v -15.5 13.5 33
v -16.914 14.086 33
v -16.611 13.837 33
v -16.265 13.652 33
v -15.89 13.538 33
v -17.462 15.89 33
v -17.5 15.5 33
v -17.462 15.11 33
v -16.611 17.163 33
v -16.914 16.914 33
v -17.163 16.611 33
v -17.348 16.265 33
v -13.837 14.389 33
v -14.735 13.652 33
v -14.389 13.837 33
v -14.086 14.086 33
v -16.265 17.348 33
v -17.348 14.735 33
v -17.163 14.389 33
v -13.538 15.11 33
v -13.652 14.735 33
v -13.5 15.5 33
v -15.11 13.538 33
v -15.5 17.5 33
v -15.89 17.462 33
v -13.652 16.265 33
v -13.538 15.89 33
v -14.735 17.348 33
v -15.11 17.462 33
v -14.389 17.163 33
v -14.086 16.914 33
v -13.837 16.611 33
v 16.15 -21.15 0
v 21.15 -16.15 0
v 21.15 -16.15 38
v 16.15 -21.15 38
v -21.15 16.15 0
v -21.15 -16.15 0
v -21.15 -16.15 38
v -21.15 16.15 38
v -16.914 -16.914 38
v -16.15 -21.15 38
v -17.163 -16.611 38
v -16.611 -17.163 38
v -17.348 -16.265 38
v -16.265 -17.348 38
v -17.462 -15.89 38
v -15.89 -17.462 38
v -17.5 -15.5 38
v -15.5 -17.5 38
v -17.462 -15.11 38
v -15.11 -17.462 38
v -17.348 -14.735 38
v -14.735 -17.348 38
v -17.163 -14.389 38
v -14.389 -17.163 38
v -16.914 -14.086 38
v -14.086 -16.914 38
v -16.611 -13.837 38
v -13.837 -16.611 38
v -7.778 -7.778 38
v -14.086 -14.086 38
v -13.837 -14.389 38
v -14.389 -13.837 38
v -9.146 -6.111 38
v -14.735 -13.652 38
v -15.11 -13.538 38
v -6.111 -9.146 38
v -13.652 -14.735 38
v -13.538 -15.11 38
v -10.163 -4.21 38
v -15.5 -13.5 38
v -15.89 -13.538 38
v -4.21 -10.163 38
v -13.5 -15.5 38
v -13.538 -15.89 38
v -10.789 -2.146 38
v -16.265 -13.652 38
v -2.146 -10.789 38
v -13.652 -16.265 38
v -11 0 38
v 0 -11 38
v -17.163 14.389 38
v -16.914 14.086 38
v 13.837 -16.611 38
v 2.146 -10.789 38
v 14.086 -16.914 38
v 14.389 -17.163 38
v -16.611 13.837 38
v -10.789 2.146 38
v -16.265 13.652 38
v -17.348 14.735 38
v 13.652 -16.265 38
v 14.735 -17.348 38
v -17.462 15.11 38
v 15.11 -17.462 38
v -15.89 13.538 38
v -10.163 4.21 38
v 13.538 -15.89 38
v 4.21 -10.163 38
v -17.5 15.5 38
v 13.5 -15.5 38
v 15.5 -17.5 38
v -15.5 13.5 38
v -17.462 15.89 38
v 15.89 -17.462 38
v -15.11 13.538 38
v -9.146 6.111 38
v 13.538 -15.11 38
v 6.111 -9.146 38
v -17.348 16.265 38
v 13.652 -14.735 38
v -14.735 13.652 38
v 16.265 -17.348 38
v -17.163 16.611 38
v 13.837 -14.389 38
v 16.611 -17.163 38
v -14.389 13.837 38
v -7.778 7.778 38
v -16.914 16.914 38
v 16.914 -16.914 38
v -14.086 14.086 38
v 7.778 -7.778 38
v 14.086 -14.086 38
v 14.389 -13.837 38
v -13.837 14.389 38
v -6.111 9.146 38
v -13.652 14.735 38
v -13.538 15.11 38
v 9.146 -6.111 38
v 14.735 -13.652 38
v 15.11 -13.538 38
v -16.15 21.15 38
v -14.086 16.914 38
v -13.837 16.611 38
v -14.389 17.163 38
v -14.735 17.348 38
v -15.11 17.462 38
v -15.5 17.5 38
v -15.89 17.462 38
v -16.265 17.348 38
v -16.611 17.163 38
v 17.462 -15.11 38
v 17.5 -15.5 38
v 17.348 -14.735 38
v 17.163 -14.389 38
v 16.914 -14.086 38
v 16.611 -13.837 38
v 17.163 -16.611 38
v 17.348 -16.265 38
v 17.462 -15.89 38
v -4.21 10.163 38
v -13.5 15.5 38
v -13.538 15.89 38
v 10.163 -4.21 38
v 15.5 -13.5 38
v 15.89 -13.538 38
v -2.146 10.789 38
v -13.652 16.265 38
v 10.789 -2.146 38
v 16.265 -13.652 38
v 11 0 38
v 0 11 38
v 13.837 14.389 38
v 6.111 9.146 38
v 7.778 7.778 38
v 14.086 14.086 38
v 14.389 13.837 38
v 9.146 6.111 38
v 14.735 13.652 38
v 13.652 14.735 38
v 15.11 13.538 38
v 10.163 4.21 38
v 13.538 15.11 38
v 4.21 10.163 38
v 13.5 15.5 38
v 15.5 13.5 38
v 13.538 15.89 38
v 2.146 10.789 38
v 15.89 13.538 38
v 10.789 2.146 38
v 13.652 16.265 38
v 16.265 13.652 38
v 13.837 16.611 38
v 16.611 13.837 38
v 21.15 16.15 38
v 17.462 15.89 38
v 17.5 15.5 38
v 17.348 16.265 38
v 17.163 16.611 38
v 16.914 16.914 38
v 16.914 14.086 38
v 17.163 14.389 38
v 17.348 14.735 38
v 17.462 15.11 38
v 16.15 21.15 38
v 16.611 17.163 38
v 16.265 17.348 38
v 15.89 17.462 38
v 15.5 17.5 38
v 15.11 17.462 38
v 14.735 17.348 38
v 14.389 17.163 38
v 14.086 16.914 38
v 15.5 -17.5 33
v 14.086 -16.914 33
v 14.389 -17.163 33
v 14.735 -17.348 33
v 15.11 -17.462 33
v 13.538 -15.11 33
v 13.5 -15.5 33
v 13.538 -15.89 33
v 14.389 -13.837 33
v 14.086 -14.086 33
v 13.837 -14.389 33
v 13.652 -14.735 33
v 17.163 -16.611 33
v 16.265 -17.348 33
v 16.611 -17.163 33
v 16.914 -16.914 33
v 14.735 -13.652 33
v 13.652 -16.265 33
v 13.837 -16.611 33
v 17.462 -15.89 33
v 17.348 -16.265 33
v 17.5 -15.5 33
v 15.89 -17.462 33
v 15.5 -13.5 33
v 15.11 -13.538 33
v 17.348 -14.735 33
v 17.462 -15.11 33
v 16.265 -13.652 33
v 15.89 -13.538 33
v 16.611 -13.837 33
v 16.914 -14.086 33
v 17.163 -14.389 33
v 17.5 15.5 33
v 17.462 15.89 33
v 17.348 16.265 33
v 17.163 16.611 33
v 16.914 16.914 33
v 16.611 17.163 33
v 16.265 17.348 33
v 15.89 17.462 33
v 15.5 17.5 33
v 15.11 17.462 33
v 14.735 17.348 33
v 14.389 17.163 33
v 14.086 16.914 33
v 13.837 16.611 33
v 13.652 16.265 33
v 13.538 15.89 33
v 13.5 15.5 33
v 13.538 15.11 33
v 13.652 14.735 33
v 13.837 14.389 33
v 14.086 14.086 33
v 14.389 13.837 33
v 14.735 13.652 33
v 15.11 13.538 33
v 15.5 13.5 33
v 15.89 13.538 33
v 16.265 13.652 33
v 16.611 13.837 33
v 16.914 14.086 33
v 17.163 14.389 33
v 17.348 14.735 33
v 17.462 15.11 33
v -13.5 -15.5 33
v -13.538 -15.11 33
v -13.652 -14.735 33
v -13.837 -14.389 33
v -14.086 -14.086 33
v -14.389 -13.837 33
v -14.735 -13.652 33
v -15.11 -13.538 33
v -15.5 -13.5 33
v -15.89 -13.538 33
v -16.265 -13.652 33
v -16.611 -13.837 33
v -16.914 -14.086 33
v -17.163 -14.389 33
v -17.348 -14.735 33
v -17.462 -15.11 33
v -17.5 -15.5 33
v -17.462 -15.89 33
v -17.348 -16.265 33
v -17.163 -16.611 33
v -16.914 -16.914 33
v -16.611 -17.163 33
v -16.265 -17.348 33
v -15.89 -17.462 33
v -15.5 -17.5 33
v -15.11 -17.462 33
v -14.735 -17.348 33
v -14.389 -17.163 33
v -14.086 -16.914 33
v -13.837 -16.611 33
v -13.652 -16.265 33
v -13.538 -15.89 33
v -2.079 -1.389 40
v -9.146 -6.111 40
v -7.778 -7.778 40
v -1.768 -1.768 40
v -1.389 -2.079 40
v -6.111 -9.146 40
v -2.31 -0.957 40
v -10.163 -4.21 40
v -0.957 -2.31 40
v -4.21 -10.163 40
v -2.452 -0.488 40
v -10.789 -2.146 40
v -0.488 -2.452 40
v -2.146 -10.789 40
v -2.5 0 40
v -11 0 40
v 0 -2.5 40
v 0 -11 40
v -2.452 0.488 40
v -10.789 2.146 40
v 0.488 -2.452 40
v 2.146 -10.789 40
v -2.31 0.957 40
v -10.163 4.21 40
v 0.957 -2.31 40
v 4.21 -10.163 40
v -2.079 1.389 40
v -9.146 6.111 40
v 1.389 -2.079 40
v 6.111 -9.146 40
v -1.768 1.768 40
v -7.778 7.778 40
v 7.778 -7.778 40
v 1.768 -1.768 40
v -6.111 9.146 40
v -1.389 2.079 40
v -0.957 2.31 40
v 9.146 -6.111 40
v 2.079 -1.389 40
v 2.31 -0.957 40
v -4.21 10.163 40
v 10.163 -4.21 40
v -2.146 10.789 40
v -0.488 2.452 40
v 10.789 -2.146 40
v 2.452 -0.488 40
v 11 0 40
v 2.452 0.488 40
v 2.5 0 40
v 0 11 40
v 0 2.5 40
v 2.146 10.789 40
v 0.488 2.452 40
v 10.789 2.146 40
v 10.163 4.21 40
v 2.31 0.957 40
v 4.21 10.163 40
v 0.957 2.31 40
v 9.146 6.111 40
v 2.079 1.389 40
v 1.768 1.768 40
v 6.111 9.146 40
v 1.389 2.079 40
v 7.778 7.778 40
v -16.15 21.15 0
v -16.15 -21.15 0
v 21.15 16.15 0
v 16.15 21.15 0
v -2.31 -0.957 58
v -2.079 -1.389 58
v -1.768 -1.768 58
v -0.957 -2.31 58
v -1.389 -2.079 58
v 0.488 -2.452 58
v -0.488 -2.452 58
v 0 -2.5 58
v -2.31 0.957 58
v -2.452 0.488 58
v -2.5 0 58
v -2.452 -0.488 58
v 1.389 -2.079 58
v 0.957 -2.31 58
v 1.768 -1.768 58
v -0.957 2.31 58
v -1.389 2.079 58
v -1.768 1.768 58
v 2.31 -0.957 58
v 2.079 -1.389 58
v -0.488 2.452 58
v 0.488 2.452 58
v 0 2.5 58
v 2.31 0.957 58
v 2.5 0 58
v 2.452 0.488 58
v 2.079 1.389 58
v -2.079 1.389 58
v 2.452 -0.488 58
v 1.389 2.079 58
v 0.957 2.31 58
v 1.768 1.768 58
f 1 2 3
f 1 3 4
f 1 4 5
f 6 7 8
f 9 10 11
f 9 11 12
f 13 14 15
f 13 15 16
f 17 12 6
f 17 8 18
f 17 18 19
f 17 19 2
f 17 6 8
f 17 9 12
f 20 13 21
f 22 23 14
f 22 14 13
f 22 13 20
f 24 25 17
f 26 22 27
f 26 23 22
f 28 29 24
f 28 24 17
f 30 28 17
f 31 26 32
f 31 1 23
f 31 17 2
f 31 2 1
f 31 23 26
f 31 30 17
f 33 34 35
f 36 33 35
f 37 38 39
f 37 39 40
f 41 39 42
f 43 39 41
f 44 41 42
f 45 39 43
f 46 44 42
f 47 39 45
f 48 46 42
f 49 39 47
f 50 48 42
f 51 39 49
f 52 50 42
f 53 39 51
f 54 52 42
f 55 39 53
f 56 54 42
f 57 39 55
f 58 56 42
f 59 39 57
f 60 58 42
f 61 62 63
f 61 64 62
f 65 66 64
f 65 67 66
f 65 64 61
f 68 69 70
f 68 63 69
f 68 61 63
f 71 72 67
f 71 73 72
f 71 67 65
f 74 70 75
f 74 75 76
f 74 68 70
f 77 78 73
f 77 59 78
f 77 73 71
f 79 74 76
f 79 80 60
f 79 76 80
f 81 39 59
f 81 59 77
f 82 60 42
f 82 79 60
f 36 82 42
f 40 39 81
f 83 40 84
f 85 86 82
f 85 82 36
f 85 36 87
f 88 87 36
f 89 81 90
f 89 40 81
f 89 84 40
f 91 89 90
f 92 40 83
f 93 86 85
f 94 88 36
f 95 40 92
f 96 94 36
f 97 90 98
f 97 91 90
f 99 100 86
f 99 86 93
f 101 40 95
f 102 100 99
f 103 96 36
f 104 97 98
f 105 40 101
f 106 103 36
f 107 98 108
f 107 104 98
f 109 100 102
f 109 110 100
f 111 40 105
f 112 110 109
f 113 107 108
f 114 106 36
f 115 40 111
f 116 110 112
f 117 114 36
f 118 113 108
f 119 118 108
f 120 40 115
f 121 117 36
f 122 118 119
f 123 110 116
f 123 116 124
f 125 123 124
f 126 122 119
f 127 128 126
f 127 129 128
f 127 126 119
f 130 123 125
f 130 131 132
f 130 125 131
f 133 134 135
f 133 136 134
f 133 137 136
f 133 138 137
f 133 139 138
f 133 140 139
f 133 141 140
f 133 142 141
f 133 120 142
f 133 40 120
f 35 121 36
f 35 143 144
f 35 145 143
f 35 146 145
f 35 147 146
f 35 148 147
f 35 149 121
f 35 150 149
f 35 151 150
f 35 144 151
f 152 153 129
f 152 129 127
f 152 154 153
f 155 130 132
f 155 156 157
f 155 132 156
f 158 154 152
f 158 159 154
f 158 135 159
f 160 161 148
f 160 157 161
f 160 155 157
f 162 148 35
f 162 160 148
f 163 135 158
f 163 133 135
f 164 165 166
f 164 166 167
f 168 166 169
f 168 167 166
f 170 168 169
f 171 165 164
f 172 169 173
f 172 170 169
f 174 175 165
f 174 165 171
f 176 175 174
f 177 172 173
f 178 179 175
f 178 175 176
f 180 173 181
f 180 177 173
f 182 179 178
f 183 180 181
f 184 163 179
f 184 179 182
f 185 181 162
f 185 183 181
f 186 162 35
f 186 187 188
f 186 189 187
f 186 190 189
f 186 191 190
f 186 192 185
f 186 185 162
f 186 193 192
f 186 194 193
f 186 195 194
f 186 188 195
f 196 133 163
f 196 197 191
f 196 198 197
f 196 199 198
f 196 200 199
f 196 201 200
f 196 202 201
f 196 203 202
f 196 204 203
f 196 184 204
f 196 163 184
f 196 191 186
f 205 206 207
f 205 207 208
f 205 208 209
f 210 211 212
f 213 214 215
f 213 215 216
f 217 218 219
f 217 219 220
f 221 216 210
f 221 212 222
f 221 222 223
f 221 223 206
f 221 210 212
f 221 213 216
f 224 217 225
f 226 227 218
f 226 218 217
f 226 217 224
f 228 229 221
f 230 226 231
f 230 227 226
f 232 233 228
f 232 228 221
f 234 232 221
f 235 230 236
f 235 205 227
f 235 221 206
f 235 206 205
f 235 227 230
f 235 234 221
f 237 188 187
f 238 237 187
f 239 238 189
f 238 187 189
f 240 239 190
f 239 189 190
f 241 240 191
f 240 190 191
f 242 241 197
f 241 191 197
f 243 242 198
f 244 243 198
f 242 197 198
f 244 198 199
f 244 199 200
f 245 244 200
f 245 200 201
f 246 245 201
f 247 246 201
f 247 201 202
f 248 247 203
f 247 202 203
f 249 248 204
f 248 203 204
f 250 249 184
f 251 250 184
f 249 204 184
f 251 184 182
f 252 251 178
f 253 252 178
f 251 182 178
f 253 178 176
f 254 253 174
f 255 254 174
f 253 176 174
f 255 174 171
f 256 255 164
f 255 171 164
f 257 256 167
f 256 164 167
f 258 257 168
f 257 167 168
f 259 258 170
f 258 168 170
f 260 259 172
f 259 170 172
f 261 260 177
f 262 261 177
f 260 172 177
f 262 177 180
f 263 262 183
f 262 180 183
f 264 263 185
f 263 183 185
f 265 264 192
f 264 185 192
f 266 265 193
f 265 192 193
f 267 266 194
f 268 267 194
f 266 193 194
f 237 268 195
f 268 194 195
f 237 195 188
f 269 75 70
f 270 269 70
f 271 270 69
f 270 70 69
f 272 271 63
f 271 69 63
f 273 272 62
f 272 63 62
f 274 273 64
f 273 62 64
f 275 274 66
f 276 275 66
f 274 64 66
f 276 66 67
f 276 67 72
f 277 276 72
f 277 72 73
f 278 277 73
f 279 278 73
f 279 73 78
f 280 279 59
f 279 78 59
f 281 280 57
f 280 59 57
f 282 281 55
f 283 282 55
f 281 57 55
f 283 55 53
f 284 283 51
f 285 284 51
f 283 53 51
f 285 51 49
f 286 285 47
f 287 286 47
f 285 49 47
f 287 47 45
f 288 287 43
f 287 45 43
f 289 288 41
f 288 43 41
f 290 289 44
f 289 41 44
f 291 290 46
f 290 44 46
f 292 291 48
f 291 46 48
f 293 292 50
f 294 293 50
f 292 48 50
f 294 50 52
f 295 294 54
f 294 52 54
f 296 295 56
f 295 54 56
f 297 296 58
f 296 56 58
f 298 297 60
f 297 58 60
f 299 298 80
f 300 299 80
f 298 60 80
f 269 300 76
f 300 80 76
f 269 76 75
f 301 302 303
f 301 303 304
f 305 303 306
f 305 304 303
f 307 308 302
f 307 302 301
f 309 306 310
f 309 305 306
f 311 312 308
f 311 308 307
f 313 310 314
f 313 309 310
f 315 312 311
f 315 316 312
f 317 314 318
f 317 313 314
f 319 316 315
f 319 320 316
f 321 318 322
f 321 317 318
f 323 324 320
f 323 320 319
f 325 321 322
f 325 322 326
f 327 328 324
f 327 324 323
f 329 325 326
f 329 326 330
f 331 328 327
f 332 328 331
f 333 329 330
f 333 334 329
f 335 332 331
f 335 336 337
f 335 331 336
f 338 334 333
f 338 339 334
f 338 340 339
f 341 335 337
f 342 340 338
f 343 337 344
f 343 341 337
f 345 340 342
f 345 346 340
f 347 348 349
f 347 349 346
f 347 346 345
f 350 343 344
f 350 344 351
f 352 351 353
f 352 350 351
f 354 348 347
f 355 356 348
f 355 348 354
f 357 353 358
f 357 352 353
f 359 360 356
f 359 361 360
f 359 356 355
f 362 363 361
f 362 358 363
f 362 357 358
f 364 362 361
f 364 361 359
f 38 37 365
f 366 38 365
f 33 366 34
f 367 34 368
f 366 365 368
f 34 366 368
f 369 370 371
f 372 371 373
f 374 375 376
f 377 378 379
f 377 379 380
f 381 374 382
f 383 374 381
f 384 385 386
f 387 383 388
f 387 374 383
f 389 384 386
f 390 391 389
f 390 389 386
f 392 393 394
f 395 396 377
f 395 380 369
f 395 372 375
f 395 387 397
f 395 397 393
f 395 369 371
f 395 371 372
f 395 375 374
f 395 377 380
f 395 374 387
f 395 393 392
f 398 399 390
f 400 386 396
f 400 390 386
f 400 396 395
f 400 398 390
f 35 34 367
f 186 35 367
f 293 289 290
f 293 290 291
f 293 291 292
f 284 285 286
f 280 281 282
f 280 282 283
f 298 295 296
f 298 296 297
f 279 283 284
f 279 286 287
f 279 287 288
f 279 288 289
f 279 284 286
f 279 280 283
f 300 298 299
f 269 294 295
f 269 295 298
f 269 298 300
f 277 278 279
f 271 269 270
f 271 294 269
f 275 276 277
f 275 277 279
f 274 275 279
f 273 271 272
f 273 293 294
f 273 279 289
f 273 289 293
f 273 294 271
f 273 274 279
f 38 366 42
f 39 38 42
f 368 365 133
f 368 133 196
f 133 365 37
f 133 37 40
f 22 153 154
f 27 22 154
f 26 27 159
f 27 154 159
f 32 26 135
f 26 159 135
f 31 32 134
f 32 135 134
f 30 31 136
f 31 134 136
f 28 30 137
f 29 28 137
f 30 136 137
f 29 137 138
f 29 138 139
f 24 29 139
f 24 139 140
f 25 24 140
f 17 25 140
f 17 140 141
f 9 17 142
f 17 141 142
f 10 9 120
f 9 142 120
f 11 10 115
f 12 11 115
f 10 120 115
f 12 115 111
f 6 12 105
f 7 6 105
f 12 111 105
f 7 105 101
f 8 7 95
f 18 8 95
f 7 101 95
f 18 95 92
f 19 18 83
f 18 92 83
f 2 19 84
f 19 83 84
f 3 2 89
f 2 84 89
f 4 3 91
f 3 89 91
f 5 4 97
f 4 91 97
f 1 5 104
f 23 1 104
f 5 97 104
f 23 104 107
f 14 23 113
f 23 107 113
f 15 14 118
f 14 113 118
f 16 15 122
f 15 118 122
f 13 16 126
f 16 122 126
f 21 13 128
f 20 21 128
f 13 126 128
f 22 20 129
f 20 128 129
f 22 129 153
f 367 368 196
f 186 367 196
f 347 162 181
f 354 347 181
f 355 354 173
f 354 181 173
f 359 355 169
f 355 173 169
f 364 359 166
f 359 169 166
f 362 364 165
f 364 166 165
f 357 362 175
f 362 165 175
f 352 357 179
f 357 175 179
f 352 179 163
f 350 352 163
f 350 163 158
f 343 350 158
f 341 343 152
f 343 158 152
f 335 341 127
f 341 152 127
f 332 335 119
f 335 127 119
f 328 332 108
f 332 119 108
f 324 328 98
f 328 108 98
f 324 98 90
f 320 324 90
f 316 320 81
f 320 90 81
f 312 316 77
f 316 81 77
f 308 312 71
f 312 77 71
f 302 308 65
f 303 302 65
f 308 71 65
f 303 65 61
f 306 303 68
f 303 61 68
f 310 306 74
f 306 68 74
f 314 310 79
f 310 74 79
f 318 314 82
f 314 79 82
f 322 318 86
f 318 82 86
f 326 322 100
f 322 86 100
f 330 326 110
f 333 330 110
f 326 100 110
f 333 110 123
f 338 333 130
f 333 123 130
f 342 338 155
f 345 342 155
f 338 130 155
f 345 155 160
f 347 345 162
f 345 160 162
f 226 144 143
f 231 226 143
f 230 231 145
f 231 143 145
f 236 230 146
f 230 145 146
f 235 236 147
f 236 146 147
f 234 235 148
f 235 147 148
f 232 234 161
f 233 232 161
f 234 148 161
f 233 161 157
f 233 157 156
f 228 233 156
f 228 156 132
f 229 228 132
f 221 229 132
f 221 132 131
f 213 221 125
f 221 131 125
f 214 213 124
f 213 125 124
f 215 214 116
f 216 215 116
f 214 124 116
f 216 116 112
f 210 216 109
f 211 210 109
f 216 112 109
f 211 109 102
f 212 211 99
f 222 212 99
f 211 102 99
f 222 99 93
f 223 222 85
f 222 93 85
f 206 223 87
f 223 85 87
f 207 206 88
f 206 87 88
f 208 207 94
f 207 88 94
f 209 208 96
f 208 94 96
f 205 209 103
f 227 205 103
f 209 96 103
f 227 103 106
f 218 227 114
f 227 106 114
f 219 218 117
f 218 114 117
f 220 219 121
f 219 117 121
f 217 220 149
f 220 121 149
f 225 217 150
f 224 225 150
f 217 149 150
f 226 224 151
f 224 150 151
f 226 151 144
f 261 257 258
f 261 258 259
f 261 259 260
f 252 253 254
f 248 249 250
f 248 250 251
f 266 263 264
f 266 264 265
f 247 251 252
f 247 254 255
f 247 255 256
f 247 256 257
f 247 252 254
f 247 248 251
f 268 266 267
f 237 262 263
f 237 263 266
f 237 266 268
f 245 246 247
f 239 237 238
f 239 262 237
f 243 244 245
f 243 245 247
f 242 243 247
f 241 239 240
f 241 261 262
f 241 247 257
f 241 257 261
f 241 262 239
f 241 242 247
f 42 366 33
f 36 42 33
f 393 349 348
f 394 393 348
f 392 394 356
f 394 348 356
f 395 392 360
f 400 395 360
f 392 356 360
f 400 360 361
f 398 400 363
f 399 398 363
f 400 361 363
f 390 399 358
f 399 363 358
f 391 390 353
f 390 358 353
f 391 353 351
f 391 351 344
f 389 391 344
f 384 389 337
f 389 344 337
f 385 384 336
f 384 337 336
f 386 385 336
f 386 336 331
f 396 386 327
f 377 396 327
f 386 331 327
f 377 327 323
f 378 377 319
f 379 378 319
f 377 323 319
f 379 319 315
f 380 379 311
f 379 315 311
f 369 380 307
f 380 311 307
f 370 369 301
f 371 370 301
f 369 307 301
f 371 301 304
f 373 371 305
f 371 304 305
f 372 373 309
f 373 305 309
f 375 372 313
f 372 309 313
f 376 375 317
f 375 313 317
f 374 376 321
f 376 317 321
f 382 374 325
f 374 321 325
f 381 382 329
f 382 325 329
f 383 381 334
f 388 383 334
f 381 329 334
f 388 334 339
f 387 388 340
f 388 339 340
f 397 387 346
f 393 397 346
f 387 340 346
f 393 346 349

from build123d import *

# Parameters (mm, degrees)
IZIM1_W                     = 42.3
IZIM1_H                     = 42.3
Y_KSEKLIK_EKSTR_ZYON1_DEPTH = 38
PAH1_SIZE                   = 5
IZIM2_R                     = 2
KES_EKSTR_ZYON1_DEPTH       = 5
IZIM3_R                     = 11
Y_KSEKLIK_EKSTR_ZYON2_DEPTH = 2
IZIM4_R                     = 2.5
Y_KSEKLIK_EKSTR_ZYON3_DEPTH = 18


with BuildPart() as part:
    # Çizim1 → Yükseklik-Ekstrüzyon1 (new body)
    with BuildSketch(Plane.XY):
        Rectangle(IZIM1_W, IZIM1_H)
    extrude(amount=Y_KSEKLIK_EKSTR_ZYON1_DEPTH)

    # Pah1
    pah1_edges = [part.edges().sort_by_distance(p)[0] for p in [
        (21.15, -21.15, 19),
        (-21.15, -21.15, 19),
        (-21.15, 21.15, 19),
        (21.15, 21.15, 19),
    ]]
    chamfer(pah1_edges, length=PAH1_SIZE)

    # Çizim2 → Kes-Ekstrüzyon1 (cut)
    with BuildSketch(Plane.XY.offset(38)):
        with Locations((-15.5, 15.5)):
            Circle(IZIM2_R)
        with Locations((15.5, 15.5)):
            Circle(IZIM2_R)
        with Locations((-15.5, -15.5)):
            Circle(IZIM2_R)
        with Locations((15.5, -15.5)):
            Circle(IZIM2_R)
    extrude(amount=-KES_EKSTR_ZYON1_DEPTH, mode=Mode.SUBTRACT)

    # Çizim3 → Yükseklik-Ekstrüzyon2 (add)
    with BuildSketch(Plane.XY.offset(38)):
        Circle(IZIM3_R)
    extrude(amount=Y_KSEKLIK_EKSTR_ZYON2_DEPTH)

    # Çizim4 → Yükseklik-Ekstrüzyon3 (add)
    with BuildSketch(Plane.XY.offset(40)):
        Circle(IZIM4_R)
    extrude(amount=Y_KSEKLIK_EKSTR_ZYON3_DEPTH)


solid = part.part
